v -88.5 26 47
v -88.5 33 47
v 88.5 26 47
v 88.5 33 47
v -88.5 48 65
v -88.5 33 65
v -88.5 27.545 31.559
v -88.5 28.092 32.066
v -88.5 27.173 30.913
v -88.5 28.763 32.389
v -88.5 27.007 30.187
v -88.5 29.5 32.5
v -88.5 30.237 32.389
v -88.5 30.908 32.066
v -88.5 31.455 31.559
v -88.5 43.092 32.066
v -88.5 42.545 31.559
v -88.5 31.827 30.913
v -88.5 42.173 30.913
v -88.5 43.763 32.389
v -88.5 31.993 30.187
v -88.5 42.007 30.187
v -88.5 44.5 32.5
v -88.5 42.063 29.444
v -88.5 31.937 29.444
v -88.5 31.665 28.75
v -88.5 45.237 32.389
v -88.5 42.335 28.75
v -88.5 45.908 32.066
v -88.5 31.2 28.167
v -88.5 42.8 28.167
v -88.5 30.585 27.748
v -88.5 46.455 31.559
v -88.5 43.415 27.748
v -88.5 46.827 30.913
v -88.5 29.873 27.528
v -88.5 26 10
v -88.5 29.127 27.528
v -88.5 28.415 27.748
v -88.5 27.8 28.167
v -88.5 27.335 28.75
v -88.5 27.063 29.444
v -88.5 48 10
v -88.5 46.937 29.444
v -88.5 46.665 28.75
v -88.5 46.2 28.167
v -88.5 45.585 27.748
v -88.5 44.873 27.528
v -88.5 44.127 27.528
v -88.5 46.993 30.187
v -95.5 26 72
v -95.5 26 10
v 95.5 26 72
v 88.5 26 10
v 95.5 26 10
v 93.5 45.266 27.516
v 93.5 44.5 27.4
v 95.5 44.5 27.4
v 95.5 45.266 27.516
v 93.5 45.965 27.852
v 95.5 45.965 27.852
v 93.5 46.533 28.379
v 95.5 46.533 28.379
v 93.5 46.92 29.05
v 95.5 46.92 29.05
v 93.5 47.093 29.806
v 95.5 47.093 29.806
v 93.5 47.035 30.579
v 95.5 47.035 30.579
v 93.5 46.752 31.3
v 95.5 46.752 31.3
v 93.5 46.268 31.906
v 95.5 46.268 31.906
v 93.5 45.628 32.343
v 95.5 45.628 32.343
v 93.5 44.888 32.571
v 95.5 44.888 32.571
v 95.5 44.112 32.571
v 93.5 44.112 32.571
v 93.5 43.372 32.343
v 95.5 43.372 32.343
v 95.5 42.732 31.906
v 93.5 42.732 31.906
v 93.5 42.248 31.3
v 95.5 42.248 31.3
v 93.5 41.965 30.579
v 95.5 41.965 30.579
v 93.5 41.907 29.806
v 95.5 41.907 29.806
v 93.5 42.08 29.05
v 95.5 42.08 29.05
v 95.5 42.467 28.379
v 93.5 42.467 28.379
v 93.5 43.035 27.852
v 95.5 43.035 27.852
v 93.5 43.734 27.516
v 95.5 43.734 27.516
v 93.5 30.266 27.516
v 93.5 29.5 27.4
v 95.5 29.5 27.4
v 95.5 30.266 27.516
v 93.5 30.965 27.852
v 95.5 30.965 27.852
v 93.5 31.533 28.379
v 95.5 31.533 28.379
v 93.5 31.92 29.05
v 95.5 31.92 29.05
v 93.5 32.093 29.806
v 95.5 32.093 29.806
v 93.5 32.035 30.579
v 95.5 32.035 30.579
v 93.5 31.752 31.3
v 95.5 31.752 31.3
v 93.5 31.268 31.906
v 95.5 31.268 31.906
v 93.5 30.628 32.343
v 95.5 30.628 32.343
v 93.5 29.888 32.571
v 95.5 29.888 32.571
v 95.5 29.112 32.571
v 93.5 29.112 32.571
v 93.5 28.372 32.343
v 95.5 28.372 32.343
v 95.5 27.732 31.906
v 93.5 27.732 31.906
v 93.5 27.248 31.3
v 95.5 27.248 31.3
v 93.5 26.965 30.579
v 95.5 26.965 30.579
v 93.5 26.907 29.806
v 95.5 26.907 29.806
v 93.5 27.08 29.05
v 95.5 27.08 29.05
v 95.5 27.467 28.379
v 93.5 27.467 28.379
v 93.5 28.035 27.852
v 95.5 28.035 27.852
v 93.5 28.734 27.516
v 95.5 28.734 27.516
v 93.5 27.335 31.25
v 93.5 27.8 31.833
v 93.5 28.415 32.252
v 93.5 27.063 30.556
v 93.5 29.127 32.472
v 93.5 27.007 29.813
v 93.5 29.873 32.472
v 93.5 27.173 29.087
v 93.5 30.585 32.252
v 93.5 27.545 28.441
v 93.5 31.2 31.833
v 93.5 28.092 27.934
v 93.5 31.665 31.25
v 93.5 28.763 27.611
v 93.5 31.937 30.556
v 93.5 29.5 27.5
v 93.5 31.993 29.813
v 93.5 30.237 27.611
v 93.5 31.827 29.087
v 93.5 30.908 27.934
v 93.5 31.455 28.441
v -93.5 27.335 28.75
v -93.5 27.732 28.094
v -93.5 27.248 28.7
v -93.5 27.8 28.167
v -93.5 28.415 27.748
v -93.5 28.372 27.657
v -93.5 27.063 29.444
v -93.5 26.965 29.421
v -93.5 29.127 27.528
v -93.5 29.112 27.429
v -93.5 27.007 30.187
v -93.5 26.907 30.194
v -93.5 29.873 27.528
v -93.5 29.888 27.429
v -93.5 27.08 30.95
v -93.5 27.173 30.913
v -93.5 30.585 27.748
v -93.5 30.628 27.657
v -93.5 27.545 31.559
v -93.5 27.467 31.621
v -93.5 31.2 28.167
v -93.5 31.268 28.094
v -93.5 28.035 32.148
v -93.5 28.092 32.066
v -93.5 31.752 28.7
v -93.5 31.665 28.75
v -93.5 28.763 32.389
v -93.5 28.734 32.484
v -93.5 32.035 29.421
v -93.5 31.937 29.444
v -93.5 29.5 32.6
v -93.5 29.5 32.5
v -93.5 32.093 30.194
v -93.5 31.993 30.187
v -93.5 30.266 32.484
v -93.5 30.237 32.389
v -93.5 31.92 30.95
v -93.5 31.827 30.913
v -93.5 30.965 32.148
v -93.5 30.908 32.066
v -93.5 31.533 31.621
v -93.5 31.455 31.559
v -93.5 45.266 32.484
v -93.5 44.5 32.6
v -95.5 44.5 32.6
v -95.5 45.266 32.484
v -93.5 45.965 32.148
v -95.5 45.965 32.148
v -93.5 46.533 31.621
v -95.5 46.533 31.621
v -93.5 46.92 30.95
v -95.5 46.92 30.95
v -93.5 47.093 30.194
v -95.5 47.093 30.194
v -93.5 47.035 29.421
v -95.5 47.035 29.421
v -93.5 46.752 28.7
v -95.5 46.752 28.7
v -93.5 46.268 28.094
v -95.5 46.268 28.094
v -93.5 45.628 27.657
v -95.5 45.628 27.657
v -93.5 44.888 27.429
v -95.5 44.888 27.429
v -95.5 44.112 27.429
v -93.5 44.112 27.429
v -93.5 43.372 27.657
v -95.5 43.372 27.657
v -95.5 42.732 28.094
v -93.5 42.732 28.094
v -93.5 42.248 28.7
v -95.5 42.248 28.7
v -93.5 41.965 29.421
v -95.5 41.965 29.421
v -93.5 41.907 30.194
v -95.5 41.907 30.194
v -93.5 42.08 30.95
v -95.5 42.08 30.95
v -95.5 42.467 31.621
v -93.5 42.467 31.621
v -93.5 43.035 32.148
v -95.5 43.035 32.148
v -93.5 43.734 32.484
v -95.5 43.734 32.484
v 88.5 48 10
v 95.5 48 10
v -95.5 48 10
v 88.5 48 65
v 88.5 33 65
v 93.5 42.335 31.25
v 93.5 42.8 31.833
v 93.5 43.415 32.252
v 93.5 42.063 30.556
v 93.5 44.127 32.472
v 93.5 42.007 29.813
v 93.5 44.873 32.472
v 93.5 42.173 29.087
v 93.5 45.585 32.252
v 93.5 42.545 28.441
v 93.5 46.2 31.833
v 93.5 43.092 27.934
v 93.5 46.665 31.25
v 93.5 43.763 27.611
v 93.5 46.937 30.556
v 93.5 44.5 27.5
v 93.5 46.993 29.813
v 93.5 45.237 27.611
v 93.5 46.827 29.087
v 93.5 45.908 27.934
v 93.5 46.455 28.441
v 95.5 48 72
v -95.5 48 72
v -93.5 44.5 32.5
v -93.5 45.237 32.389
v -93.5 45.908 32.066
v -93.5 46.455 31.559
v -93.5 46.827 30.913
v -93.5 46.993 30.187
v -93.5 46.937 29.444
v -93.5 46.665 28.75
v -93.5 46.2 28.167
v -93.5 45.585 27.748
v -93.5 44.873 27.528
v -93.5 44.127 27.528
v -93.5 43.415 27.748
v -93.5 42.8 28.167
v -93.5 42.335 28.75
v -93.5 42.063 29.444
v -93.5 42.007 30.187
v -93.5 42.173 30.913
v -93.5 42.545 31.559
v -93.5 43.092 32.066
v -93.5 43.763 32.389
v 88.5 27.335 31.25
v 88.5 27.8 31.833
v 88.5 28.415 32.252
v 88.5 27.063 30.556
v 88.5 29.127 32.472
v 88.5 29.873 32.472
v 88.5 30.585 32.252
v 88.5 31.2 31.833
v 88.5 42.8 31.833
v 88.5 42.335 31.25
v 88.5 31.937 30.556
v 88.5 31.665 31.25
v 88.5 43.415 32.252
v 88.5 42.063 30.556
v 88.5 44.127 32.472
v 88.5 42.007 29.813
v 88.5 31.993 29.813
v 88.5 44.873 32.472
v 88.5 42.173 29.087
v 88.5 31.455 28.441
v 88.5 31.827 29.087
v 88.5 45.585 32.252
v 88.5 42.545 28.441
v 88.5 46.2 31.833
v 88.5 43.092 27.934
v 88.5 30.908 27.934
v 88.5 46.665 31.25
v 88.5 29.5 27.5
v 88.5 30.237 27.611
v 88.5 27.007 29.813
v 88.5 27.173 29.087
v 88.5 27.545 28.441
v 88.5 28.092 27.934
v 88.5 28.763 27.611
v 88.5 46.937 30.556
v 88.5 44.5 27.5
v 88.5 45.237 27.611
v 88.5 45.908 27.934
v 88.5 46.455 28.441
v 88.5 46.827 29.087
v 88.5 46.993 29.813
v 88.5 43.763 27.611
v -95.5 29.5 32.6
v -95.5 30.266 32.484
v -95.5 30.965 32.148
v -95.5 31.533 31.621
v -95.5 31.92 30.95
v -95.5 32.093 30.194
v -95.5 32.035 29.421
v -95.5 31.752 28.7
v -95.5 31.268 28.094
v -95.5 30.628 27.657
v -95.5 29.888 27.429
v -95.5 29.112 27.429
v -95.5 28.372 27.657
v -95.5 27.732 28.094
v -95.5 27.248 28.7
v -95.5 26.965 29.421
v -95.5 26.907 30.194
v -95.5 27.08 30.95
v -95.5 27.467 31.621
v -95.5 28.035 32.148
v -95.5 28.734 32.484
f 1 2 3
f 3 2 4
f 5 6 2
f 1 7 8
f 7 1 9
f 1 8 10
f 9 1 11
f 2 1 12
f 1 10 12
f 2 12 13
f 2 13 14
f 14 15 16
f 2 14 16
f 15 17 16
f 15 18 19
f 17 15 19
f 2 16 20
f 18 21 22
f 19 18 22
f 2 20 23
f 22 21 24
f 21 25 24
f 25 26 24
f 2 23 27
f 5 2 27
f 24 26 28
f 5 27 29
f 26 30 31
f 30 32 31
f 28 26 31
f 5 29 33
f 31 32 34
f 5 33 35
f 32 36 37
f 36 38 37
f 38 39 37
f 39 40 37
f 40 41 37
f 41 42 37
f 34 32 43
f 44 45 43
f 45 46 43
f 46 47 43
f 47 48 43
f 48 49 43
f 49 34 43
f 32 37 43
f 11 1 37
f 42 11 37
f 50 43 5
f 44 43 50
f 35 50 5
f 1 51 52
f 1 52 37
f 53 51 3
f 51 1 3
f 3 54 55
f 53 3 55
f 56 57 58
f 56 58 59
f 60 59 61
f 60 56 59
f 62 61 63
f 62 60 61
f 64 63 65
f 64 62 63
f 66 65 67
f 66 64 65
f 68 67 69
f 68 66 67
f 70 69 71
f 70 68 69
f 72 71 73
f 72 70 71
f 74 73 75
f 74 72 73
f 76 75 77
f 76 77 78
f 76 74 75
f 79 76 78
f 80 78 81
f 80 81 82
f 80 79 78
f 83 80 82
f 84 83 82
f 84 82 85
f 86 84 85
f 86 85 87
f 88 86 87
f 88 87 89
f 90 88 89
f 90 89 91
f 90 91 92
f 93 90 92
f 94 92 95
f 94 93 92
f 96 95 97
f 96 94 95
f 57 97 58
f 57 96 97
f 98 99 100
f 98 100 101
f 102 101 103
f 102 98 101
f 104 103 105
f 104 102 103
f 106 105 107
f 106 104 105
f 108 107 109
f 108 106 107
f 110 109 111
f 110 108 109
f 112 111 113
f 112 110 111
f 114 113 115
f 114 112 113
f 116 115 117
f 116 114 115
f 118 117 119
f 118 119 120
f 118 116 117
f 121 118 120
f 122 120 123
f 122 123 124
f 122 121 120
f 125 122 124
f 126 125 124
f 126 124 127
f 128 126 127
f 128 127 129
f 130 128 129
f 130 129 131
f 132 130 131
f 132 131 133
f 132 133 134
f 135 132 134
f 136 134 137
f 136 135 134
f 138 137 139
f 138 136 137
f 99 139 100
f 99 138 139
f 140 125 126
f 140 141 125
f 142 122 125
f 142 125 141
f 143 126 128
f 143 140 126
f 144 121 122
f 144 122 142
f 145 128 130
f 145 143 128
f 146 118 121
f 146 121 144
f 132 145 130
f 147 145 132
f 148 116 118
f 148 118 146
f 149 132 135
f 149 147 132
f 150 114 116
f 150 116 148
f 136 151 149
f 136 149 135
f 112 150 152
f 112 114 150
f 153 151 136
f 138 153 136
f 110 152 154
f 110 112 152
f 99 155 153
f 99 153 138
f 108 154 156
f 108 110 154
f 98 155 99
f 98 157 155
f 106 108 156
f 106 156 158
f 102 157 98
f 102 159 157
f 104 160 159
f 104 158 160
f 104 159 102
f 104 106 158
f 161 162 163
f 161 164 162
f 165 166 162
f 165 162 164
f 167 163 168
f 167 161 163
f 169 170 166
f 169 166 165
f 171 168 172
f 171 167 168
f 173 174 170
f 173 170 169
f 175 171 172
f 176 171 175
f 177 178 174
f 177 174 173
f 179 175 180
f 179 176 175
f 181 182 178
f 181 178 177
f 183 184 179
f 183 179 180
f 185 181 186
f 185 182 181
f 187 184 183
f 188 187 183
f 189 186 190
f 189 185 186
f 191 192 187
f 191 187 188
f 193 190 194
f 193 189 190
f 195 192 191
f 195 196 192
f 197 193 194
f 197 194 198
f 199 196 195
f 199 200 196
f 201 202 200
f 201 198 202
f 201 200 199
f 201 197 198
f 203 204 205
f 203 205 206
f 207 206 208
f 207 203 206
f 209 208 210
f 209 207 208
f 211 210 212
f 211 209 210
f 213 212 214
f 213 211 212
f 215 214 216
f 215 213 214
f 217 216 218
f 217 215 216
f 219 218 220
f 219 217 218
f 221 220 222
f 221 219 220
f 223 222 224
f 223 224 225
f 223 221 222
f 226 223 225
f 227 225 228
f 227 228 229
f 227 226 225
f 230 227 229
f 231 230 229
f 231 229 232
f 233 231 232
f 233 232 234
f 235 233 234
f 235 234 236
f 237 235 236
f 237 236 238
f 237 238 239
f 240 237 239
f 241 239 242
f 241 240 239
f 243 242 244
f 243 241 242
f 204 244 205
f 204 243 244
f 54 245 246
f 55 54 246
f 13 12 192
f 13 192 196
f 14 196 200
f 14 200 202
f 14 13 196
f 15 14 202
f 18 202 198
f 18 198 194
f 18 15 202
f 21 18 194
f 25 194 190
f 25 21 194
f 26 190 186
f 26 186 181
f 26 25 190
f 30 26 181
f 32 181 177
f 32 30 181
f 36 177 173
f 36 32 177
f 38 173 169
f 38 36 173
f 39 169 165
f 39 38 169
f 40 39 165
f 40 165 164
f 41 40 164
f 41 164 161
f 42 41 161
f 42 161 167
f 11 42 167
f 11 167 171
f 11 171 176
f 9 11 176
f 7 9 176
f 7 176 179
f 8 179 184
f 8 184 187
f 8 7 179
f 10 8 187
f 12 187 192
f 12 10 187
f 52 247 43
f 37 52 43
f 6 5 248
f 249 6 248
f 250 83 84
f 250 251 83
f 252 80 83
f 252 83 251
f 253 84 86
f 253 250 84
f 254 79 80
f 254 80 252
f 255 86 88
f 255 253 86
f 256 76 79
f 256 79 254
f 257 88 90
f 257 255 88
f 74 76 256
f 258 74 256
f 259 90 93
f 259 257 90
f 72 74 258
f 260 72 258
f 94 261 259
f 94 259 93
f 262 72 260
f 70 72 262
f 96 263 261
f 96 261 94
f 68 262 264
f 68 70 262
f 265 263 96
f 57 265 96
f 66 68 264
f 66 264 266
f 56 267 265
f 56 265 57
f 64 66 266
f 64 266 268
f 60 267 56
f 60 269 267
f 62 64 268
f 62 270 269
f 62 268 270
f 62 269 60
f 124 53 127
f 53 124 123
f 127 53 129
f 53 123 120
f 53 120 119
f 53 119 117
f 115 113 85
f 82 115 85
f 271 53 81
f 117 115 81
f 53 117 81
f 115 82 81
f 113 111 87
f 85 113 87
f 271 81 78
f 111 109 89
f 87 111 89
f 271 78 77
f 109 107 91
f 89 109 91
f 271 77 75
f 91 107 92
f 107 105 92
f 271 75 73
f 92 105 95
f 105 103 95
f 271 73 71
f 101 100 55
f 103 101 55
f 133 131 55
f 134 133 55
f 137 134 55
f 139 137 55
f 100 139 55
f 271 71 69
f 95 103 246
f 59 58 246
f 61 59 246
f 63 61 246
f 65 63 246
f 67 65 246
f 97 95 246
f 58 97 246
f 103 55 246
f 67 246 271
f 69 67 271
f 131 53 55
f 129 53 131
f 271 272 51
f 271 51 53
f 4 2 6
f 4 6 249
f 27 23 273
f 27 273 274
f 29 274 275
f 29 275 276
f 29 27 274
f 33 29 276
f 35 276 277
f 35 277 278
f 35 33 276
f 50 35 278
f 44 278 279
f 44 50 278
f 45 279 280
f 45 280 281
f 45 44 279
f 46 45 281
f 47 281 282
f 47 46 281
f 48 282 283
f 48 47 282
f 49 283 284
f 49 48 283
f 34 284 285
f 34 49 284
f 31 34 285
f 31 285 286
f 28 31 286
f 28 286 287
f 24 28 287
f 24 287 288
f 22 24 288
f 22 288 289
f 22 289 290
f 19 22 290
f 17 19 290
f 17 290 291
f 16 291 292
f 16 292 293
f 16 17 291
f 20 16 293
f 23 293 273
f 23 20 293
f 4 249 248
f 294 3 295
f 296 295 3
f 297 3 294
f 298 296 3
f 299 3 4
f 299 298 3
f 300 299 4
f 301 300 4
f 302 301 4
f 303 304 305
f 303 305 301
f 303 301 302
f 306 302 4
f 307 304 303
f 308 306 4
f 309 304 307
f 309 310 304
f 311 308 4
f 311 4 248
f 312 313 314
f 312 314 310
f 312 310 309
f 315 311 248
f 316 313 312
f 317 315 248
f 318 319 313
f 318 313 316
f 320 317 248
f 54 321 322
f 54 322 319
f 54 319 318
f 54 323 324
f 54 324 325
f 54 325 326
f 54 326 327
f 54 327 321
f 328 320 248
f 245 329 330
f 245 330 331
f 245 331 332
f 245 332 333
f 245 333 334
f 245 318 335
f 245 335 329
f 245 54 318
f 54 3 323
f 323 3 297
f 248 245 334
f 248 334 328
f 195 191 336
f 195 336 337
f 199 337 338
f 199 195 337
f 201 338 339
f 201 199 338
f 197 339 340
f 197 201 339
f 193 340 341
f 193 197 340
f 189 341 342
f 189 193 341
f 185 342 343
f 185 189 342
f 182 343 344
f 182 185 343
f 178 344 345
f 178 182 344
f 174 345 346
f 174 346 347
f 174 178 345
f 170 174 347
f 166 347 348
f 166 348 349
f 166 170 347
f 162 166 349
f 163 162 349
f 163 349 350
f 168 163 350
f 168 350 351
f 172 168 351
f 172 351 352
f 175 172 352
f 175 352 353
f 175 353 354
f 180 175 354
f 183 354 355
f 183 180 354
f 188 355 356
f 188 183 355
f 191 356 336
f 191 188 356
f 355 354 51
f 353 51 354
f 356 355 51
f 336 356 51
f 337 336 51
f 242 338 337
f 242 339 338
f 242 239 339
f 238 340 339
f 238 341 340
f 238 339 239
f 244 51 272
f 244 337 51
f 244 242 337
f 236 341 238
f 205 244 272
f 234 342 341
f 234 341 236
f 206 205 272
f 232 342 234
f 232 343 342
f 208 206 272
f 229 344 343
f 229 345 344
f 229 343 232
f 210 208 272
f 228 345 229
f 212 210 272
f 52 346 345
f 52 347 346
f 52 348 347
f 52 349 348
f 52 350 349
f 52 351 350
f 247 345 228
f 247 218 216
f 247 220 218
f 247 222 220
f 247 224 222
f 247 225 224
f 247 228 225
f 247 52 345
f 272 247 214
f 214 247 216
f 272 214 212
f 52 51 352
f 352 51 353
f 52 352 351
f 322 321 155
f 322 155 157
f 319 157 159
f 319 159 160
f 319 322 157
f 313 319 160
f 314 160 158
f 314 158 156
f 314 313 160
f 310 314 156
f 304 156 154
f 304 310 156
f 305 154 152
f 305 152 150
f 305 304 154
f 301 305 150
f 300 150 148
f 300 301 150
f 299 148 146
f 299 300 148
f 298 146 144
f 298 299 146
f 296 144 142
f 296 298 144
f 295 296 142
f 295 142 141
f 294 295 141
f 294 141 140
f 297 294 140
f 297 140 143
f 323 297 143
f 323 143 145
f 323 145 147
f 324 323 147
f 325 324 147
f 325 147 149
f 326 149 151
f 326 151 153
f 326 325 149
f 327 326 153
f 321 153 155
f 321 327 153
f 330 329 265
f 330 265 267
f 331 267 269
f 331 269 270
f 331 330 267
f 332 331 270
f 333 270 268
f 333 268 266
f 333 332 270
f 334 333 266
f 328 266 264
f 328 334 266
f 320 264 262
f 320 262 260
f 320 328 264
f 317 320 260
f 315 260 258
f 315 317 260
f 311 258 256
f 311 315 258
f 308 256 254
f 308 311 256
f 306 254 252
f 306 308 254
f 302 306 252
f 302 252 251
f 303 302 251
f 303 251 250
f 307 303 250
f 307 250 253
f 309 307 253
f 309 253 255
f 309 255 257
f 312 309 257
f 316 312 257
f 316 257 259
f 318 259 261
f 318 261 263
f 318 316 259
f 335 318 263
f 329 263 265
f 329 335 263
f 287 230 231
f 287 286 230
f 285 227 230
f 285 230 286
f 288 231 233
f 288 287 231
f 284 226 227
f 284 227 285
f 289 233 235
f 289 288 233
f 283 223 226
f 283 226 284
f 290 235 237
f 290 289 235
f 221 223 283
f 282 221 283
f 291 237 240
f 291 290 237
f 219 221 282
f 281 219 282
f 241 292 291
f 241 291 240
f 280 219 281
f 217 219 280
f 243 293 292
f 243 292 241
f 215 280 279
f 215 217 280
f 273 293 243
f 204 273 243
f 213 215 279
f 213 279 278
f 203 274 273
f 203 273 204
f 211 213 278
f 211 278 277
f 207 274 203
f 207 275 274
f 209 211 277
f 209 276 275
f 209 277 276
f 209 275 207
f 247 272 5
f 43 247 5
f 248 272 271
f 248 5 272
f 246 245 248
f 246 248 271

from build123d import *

# Parameters (mm, degrees)
CYLINDER145_R             = 2.6
CYLINDER145_DEPTH         = 2
CYLINDER144_R             = 2.5
CYLINDER144_DEPTH         = 5
FUSION066_PLACEMENT_ANGLE = 90
CYLINDER153_R             = 2.6
CYLINDER153_DEPTH         = 2
CYLINDER152_R             = 2.5
CYLINDER152_DEPTH         = 5
FUSION070_PLACEMENT_ANGLE = 90
CYLINDER148_R             = 2.6
CYLINDER148_DEPTH         = 2
CYLINDER147_R             = 2.5
CYLINDER147_DEPTH         = 5
FUSION071_PLACEMENT_ANGLE = 90
CYLINDER139_R             = 2.6
CYLINDER139_DEPTH         = 2
CYLINDER138_R             = 2.5
CYLINDER138_DEPTH         = 5
FUSION064_PLACEMENT_ANGLE = 270
BOX037_W                  = 177
BOX037_H                  = 7
BOX037_DEPTH              = 18
BOX033_W                  = 7
BOX033_H                  = 22
BOX033_DEPTH              = 55
BOX034_W                  = 191
BOX034_H                  = 22
BOX034_DEPTH              = 7
BOX032_W                  = 7
BOX032_H                  = 22
BOX032_DEPTH              = 55


with BuildPart() as cilindro145:
    # Cylinder145 → Cylinder145 (new body)
    with BuildSketch(Plane.XY.offset(5)):
        Circle(CYLINDER145_R)
    extrude(amount=CYLINDER145_DEPTH)


with BuildPart() as enganche_lego032:
    # Cylinder144 → Cylinder144 (new body)
    with BuildSketch(Plane.XY):
        Circle(CYLINDER144_R)
    extrude(amount=CYLINDER144_DEPTH)

    # Fusion066: union Cilindro145
    add(cilindro145.part)


with BuildPart() as enganche_lego032_1:
    # Fusion066 placement: moved
    add(enganche_lego032.part.moved(Location((88.5, 29.5, 30))).rotate(Axis((88.5, 29.5, 30), (0, 1, 0)), FUSION066_PLACEMENT_ANGLE))


with BuildPart() as cilindro153:
    # Cylinder153 → Cylinder153 (new body)
    with BuildSketch(Plane.XY.offset(5)):
        Circle(CYLINDER153_R)
    extrude(amount=CYLINDER153_DEPTH)


with BuildPart() as enganche_lego036:
    # Cylinder152 → Cylinder152 (new body)
    with BuildSketch(Plane.XY):
        Circle(CYLINDER152_R)
    extrude(amount=CYLINDER152_DEPTH)

    # Fusion070: union Cilindro153
    add(cilindro153.part)


with BuildPart() as enganche_lego036_1:
    # Fusion070 placement: moved
    add(enganche_lego036.part.moved(Location((88.5, 44.5, 30))).rotate(Axis((88.5, 44.5, 30), (0, 1, 0)), FUSION070_PLACEMENT_ANGLE))


with BuildPart() as cilindro148:
    # Cylinder148 → Cylinder148 (new body)
    with BuildSketch(Plane.XY.offset(5)):
        Circle(CYLINDER148_R)
    extrude(amount=CYLINDER148_DEPTH)


with BuildPart() as enganche_lego037:
    # Cylinder147 → Cylinder147 (new body)
    with BuildSketch(Plane.XY):
        Circle(CYLINDER147_R)
    extrude(amount=CYLINDER147_DEPTH)

    # Fusion071: union Cilindro148
    add(cilindro148.part)


with BuildPart() as enganche_lego037_1:
    # Fusion071 placement: moved
    add(enganche_lego037.part.moved(Location((-88.5, 44.5, 30))).rotate(Axis((-88.5, 44.5, 30), (0, -1, 0)), FUSION071_PLACEMENT_ANGLE))


with BuildPart() as cilindro139:
    # Cylinder139 → Cylinder139 (new body)
    with BuildSketch(Plane.XY.offset(5)):
        Circle(CYLINDER139_R)
    extrude(amount=CYLINDER139_DEPTH)


with BuildPart() as fusion074:
    # Cylinder138 → Cylinder138 (new body)
    with BuildSketch(Plane.XY):
        Circle(CYLINDER138_R)
    extrude(amount=CYLINDER138_DEPTH)

    # Fusion064: union Cilindro139
    add(cilindro139.part)


with BuildPart() as fusion074_1:
    # Fusion064 placement: moved
    add(fusion074.part.moved(Location((-88.5, 29.5, 30))).rotate(Axis((-88.5, 29.5, 30), (0, 1, 0)), FUSION064_PLACEMENT_ANGLE))

    # Fusion074: union enganche_lego032, enganche_lego036, enganche_lego037
    add(enganche_lego032_1.part)
    add(enganche_lego036_1.part)
    add(enganche_lego037_1.part)


with BuildPart() as cubo034:
    # Box037 → Box037 (new body)
    with BuildSketch(Plane(origin=(-88.5, 26, 47), x_dir=(1, 0, 0), z_dir=(0, 0, 1))):
        with Locations((88.5, 3.5)):
            Rectangle(BOX037_W, BOX037_H)
    extrude(amount=BOX037_DEPTH)


with BuildPart() as cubo030:
    # Box033 → Box033 (new body)
    with BuildSketch(Plane(origin=(88.5, 26, 10), x_dir=(1, 0, 0), z_dir=(0, 0, 1))):
        with Locations((3.5, 11)):
            Rectangle(BOX033_W, BOX033_H)
    extrude(amount=BOX033_DEPTH)


with BuildPart() as cubo031:
    # Box034 → Box034 (new body)
    with BuildSketch(Plane(origin=(-95.5, 26, 65), x_dir=(1, 0, 0), z_dir=(0, 0, 1))):
        with Locations((95.5, 11)):
            Rectangle(BOX034_W, BOX034_H)
    extrude(amount=BOX034_DEPTH)


with BuildPart() as engranajesuj2:
    # Box032 → Box032 (new body)
    with BuildSketch(Plane(origin=(-95.5, 26, 10), x_dir=(1, 0, 0), z_dir=(0, 0, 1))):
        with Locations((3.5, 11)):
            Rectangle(BOX032_W, BOX032_H)
    extrude(amount=BOX032_DEPTH)

    # Fusion058: union Cubo034, Cubo030, Cubo031
    add(cubo034.part)
    add(cubo030.part)
    add(cubo031.part)

    # Cut058: cut Fusion074
    add(fusion074_1.part, mode=Mode.SUBTRACT)


solid = engranajesuj2.part
